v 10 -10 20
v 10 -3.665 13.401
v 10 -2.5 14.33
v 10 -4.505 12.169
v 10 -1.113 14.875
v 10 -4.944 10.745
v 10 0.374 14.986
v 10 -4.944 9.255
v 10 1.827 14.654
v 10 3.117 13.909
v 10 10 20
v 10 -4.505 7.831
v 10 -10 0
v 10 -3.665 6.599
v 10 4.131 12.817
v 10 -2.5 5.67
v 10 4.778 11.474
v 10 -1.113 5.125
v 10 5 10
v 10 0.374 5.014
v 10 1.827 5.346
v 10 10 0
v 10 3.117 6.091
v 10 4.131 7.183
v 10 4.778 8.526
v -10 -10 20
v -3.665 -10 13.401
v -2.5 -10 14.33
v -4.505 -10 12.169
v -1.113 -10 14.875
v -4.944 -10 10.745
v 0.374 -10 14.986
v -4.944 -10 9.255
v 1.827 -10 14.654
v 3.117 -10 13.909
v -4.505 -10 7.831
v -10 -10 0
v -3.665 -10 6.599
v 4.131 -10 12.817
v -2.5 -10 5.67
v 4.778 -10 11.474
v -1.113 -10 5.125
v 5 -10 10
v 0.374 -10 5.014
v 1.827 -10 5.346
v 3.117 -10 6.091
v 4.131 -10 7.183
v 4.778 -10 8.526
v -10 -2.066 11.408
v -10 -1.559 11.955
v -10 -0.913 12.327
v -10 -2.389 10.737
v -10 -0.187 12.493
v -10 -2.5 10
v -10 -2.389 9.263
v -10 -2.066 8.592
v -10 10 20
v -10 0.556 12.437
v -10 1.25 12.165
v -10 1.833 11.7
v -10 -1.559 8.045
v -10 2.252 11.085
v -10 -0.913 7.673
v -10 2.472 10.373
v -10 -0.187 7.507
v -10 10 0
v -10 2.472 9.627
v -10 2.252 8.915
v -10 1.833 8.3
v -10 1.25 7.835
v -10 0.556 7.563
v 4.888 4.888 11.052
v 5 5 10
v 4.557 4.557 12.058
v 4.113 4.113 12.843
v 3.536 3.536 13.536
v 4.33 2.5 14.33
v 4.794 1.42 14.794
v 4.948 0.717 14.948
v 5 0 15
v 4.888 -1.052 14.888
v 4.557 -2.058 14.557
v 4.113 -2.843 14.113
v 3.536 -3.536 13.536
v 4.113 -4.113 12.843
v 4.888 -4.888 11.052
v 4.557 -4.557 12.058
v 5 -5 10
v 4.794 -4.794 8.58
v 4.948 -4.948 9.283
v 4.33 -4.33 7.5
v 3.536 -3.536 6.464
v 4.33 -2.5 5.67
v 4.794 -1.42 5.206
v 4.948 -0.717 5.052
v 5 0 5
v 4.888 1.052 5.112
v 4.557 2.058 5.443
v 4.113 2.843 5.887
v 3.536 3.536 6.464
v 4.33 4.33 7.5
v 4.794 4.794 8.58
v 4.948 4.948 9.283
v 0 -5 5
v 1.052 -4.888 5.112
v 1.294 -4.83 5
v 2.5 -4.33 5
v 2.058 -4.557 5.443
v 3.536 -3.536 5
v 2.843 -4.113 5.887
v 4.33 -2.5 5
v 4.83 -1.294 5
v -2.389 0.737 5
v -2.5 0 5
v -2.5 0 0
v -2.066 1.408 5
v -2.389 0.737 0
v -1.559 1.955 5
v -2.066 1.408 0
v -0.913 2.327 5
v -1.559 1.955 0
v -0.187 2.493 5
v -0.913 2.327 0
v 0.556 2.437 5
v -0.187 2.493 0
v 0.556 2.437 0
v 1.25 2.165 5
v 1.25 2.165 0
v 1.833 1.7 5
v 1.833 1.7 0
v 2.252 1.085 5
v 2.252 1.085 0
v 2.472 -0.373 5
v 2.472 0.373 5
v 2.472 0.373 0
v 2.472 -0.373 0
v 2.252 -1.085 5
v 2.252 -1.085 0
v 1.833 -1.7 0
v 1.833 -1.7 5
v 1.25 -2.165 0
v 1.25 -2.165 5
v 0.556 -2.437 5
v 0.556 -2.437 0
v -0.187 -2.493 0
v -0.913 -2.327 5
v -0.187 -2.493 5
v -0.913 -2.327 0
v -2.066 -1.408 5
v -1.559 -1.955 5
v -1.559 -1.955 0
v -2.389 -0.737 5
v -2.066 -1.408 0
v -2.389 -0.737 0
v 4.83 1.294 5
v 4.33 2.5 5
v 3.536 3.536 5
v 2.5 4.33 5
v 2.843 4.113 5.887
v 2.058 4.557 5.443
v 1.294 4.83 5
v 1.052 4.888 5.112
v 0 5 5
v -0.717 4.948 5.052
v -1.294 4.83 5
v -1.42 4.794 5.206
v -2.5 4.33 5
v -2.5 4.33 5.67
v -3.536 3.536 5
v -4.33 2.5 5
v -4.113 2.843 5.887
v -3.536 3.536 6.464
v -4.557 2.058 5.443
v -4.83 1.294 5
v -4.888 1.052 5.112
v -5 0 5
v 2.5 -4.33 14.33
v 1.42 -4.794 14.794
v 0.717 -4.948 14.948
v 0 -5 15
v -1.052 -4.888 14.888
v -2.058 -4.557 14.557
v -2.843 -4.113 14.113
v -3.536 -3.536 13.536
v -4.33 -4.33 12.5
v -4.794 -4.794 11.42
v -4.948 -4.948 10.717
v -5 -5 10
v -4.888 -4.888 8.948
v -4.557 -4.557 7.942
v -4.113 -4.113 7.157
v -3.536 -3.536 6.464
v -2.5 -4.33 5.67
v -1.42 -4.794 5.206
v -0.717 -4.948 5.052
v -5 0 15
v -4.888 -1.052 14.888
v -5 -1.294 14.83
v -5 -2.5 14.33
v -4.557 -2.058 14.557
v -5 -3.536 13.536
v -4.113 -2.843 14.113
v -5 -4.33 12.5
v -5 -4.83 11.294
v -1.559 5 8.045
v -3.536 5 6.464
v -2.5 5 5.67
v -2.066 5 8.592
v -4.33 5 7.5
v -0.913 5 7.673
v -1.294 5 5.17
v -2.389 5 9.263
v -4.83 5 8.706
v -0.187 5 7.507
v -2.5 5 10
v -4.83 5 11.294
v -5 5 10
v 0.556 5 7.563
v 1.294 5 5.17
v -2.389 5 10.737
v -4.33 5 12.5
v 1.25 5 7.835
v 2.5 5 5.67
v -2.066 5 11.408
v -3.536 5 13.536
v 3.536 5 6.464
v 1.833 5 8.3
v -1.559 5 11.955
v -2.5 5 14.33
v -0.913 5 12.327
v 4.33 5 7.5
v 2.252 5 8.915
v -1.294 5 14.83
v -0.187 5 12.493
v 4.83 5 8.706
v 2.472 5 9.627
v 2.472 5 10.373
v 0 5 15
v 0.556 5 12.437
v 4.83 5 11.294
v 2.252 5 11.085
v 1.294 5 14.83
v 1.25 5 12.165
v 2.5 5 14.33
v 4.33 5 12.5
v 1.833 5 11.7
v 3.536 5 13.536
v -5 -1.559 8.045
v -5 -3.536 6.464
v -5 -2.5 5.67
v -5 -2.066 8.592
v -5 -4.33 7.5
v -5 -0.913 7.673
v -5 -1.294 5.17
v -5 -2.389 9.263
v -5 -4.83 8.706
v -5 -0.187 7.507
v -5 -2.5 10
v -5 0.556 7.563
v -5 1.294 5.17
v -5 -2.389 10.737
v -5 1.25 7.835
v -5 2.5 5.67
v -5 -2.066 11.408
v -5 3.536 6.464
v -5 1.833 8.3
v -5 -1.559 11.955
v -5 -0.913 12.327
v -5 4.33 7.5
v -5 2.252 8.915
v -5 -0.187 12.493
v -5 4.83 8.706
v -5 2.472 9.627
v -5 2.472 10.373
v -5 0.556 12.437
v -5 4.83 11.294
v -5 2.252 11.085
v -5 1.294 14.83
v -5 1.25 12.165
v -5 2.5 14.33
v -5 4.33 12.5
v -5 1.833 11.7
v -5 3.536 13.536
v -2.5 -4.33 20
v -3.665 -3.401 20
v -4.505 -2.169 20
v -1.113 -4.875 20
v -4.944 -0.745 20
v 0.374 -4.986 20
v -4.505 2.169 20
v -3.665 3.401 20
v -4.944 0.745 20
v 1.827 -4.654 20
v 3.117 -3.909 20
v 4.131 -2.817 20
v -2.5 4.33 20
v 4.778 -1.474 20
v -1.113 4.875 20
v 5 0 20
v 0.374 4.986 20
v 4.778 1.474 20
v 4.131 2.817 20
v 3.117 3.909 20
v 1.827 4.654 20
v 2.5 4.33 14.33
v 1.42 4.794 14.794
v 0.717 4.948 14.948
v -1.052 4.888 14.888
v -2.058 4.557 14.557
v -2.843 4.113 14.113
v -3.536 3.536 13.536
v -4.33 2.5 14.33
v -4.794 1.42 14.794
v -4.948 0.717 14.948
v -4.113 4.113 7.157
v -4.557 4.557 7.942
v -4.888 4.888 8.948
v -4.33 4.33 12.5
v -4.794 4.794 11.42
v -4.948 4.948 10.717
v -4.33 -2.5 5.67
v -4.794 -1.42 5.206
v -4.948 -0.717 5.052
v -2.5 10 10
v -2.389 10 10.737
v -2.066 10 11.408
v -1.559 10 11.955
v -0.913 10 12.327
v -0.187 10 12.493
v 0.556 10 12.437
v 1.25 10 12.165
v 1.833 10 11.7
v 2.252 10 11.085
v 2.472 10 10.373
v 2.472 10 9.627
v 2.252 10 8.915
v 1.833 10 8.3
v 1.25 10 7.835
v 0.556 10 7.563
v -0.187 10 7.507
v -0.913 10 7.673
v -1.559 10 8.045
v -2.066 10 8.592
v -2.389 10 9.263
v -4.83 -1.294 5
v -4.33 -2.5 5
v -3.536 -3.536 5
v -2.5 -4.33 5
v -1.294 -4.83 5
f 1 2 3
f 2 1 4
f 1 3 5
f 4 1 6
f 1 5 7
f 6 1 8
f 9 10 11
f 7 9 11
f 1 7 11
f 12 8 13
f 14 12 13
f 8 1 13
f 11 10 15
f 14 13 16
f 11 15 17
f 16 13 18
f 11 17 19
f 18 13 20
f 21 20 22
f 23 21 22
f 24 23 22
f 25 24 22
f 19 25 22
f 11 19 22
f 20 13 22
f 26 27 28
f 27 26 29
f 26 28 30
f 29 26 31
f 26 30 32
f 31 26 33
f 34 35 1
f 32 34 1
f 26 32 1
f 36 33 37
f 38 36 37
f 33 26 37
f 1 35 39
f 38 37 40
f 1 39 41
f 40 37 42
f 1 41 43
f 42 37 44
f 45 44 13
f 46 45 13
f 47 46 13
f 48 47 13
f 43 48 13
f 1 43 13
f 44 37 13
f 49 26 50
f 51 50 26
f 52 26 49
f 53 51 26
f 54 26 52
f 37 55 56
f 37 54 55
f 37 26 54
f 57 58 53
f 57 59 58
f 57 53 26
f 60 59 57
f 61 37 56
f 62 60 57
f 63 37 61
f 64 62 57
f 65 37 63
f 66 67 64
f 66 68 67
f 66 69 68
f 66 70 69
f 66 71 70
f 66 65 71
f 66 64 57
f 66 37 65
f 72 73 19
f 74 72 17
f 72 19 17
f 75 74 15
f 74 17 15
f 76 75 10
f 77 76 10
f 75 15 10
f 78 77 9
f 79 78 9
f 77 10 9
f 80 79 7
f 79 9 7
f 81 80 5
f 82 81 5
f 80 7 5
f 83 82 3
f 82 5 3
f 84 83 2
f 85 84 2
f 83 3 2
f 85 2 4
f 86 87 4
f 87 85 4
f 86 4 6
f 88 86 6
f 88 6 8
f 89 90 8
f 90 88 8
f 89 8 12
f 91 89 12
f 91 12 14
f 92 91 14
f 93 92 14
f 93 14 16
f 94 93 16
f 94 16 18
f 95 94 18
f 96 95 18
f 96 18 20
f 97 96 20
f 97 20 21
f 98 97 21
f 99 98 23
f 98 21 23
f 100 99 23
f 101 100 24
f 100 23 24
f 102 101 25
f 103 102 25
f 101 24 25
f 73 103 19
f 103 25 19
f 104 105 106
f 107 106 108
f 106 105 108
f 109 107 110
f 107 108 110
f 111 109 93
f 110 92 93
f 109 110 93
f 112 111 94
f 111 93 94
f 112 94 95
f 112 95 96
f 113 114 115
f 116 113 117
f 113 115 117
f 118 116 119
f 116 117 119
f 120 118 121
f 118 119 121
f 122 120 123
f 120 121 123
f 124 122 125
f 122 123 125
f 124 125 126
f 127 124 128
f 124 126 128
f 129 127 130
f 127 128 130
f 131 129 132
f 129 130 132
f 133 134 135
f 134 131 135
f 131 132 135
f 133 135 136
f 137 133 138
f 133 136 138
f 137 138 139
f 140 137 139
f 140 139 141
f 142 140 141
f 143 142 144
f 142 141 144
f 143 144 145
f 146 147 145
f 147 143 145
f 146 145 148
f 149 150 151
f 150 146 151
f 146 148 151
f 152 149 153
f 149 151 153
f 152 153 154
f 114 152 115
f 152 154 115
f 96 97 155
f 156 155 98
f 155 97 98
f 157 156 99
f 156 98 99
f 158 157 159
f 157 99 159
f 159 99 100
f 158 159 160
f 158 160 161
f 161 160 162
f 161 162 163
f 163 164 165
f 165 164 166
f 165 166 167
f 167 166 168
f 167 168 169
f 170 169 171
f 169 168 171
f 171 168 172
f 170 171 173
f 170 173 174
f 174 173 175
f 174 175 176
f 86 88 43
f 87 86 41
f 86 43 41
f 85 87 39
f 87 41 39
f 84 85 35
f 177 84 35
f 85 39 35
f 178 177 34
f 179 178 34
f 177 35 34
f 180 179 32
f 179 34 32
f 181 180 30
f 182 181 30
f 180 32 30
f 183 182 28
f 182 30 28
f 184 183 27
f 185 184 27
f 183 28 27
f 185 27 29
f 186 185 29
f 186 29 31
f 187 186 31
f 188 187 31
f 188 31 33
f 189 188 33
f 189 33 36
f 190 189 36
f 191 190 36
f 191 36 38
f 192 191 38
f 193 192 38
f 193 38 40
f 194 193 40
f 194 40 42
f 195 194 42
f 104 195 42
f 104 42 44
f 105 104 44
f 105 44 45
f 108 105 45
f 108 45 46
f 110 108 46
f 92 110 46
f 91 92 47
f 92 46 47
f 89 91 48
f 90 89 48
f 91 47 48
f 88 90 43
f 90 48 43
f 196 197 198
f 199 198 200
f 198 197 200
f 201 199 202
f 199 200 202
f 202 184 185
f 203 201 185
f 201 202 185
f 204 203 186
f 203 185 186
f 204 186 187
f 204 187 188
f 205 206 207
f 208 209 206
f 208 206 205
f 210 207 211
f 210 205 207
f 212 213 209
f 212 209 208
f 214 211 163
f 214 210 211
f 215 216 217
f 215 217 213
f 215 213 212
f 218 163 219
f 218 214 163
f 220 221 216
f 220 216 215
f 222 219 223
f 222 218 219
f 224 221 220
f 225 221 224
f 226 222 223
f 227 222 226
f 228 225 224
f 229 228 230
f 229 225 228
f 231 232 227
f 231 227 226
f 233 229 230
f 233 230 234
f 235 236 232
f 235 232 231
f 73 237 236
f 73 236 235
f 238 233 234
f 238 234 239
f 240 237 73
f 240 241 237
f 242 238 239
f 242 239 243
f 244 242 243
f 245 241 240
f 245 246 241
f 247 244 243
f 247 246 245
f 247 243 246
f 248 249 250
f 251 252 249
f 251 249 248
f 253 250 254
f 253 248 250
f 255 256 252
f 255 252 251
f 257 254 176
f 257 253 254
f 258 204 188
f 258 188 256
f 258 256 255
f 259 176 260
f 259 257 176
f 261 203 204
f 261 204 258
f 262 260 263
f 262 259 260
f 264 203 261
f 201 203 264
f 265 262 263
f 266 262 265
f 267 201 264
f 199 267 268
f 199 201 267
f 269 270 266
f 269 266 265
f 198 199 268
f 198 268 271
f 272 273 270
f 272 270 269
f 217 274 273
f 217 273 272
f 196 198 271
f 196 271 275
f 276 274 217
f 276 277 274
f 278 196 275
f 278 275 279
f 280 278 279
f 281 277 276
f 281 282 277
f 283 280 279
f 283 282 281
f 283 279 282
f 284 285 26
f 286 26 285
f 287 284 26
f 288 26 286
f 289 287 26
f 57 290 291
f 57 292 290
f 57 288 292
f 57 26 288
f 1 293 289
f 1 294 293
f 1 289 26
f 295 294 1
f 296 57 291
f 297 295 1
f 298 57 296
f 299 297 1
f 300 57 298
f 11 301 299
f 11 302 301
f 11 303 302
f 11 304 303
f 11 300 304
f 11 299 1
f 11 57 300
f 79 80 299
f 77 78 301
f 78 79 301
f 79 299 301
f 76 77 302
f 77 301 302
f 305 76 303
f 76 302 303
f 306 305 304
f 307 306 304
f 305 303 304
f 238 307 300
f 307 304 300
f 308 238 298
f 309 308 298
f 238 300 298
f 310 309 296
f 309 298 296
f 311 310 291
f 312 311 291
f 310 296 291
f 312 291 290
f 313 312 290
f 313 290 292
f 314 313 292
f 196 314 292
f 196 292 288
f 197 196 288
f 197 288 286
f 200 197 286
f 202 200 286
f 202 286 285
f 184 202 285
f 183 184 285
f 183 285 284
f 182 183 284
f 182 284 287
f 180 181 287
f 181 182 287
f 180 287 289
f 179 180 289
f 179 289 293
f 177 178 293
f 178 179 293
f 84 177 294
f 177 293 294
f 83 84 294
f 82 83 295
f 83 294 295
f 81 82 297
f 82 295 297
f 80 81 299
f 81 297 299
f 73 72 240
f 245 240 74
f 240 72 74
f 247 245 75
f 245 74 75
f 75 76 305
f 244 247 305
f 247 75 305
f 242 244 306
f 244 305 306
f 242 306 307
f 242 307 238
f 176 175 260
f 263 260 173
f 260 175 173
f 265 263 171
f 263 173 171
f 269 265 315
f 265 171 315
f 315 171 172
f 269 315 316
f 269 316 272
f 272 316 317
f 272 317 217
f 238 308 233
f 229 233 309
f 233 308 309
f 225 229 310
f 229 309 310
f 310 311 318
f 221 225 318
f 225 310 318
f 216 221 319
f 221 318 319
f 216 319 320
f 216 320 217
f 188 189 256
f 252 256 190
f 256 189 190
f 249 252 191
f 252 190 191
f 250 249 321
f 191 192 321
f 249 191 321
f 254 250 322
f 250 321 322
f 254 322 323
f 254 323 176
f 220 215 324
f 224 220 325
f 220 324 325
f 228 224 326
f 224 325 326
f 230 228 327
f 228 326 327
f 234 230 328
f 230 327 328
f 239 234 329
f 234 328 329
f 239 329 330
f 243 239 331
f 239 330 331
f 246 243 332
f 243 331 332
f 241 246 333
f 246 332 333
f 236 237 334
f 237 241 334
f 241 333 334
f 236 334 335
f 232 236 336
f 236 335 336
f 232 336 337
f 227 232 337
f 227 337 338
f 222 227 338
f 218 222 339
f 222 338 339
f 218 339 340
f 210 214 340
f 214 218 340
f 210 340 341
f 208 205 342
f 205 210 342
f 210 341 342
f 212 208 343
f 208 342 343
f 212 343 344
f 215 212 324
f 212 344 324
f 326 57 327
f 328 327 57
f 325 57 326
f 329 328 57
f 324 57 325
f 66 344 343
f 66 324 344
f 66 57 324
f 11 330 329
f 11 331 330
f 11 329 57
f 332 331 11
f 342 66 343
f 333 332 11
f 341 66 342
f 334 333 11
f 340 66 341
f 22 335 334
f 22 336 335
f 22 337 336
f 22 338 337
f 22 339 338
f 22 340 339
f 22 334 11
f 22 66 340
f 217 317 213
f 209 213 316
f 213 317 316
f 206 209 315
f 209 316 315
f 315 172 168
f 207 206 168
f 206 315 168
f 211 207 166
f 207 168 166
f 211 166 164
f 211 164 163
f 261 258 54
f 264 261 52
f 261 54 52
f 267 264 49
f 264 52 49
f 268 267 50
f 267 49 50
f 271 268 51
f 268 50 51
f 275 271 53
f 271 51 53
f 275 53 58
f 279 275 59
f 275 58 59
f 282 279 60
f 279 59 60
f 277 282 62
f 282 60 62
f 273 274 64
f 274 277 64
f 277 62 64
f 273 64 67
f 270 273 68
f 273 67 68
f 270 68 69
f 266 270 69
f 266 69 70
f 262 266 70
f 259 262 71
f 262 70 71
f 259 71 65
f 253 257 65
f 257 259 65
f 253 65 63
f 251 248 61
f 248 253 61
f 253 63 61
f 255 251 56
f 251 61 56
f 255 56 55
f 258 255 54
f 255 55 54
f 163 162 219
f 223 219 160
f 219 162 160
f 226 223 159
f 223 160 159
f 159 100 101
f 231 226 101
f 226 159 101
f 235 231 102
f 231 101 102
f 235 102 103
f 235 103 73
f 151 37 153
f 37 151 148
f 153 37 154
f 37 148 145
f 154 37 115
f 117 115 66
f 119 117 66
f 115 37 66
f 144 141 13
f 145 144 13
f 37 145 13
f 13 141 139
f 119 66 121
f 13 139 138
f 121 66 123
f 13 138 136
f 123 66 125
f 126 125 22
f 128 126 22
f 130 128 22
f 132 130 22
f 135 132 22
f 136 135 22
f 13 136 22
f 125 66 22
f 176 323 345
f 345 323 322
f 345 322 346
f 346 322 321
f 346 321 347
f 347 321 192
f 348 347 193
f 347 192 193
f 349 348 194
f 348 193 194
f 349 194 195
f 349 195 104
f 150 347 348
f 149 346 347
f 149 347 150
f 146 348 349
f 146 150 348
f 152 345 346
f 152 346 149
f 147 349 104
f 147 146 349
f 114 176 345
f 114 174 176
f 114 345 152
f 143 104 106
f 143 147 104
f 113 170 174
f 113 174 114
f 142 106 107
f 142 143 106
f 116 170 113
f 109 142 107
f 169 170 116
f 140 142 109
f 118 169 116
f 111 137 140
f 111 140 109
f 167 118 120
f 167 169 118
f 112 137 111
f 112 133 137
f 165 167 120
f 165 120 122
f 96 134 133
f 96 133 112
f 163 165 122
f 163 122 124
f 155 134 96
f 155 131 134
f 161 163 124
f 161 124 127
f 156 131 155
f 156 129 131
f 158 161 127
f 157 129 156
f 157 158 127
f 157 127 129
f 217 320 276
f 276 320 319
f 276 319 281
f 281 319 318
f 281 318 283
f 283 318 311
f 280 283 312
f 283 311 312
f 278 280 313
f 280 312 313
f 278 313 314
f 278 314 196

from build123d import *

# Parameters (mm, degrees)
F0_W                 = 20
F0_H                 = 20
F1_DEPTH             = 20
F5_D                 = 5
F5_CBORE_D           = 10
F5_CBORE_DEPTH       = 15
F5_ON_F3_D           = 5
F5_ON_F3_CBORE_D     = 10
F5_ON_F3_CBORE_DEPTH = 15
F5_ON_F4_D           = 5
F5_ON_F4_CBORE_D     = 10
F5_ON_F4_CBORE_DEPTH = 15


with BuildPart() as f1:
    # F0 (on Top) → F1 (new body)
    with BuildSketch(Plane.XY):
        Rectangle(F0_W, F0_H)
    extrude(amount=F1_DEPTH)

    # F5 (through all)
    with Locations(Plane.XZ.offset(10)):
        with Locations((0, 10)):
            CounterBoreHole(F5_D / 2, F5_CBORE_D / 2, F5_CBORE_DEPTH)

    # F5 on F3 (through all)
    with Locations(Plane.YZ.offset(10)):
        with Locations((0, 10)):
            CounterBoreHole(F5_ON_F3_D / 2, F5_ON_F3_CBORE_D / 2, F5_ON_F3_CBORE_DEPTH)

    # F5 on F4 (through all)
    with Locations(Plane.XY.offset(20)):
        with Locations((0, 0)):
            CounterBoreHole(F5_ON_F4_D / 2, F5_ON_F4_CBORE_D / 2, F5_ON_F4_CBORE_DEPTH)


solid = f1.part
